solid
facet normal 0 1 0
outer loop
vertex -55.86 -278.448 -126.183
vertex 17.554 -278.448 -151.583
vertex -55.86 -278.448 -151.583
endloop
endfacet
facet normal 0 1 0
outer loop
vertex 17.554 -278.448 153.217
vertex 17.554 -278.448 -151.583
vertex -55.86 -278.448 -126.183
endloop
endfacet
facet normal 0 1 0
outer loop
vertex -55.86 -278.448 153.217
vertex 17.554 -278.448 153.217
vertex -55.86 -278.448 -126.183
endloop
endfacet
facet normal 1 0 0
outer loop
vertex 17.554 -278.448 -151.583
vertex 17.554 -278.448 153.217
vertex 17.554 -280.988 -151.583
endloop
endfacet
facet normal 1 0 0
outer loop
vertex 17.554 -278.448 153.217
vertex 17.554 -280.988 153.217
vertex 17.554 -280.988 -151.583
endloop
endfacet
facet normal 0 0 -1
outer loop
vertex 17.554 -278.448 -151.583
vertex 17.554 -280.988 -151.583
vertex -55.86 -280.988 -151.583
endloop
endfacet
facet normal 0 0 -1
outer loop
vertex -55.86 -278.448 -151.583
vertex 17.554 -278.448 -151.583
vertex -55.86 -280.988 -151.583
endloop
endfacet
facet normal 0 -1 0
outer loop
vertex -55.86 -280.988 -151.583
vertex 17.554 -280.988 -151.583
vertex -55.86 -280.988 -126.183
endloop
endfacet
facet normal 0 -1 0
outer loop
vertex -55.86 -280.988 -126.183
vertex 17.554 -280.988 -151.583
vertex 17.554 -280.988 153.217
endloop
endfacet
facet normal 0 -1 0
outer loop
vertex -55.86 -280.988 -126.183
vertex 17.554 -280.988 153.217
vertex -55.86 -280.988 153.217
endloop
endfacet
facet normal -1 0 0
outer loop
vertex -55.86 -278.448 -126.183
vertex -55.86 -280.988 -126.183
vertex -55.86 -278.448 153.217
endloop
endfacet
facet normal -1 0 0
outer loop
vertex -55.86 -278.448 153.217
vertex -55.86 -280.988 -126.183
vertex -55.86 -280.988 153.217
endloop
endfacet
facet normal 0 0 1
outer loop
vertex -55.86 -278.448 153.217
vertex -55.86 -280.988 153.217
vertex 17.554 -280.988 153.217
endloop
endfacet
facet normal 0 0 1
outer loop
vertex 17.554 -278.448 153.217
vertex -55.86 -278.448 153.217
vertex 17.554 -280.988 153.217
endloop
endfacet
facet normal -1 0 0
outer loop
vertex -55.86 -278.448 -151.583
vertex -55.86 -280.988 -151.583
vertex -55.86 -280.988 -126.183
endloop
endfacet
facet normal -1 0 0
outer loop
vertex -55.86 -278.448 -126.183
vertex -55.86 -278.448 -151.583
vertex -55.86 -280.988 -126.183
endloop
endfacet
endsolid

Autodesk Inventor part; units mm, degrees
ref_plane "YZ Plane" through (0, 0, 0) normal (1, 0, 0) x (0, 1, 0)
ref_plane "XY Plane" through (0, 0, 0) normal (0, 0, 1) x (1, 0, 0)
ref_plane "Work Plane1" through (0, -280.9875, 0) normal (0, 1, 0) x (-1, 0, 0)
sketch "Sketch1" plane through (0, -280.9875, 0) normal (0, 1, 0) x (-1, 0, 0)
  line L0 (-17.5545, -151.5833) -> (55.8597, -151.5833)
  line L1 (55.8597, -151.5833) -> (55.8597, 153.2167)
  line L2 (55.8597, 153.2167) -> (-17.5545, 153.2167)
  line L3 (-17.5545, 153.2167) -> (-17.5545, -151.5833)
  line L4 (-17.5545, 261.1667) -> (-17.5545, -259.5333)
  line L5 (55.8597, -126.1833) -> (55.8597, -151.5833)
  point P0 (0, 0)
  point P1 (-17.5545, -126.1833)
  point P2 (-17.5545, 127.8167)
extrude "Extrusion1" add sketch "Sketch1" along normal blind 2.54
properties part number "plexiglass1"
